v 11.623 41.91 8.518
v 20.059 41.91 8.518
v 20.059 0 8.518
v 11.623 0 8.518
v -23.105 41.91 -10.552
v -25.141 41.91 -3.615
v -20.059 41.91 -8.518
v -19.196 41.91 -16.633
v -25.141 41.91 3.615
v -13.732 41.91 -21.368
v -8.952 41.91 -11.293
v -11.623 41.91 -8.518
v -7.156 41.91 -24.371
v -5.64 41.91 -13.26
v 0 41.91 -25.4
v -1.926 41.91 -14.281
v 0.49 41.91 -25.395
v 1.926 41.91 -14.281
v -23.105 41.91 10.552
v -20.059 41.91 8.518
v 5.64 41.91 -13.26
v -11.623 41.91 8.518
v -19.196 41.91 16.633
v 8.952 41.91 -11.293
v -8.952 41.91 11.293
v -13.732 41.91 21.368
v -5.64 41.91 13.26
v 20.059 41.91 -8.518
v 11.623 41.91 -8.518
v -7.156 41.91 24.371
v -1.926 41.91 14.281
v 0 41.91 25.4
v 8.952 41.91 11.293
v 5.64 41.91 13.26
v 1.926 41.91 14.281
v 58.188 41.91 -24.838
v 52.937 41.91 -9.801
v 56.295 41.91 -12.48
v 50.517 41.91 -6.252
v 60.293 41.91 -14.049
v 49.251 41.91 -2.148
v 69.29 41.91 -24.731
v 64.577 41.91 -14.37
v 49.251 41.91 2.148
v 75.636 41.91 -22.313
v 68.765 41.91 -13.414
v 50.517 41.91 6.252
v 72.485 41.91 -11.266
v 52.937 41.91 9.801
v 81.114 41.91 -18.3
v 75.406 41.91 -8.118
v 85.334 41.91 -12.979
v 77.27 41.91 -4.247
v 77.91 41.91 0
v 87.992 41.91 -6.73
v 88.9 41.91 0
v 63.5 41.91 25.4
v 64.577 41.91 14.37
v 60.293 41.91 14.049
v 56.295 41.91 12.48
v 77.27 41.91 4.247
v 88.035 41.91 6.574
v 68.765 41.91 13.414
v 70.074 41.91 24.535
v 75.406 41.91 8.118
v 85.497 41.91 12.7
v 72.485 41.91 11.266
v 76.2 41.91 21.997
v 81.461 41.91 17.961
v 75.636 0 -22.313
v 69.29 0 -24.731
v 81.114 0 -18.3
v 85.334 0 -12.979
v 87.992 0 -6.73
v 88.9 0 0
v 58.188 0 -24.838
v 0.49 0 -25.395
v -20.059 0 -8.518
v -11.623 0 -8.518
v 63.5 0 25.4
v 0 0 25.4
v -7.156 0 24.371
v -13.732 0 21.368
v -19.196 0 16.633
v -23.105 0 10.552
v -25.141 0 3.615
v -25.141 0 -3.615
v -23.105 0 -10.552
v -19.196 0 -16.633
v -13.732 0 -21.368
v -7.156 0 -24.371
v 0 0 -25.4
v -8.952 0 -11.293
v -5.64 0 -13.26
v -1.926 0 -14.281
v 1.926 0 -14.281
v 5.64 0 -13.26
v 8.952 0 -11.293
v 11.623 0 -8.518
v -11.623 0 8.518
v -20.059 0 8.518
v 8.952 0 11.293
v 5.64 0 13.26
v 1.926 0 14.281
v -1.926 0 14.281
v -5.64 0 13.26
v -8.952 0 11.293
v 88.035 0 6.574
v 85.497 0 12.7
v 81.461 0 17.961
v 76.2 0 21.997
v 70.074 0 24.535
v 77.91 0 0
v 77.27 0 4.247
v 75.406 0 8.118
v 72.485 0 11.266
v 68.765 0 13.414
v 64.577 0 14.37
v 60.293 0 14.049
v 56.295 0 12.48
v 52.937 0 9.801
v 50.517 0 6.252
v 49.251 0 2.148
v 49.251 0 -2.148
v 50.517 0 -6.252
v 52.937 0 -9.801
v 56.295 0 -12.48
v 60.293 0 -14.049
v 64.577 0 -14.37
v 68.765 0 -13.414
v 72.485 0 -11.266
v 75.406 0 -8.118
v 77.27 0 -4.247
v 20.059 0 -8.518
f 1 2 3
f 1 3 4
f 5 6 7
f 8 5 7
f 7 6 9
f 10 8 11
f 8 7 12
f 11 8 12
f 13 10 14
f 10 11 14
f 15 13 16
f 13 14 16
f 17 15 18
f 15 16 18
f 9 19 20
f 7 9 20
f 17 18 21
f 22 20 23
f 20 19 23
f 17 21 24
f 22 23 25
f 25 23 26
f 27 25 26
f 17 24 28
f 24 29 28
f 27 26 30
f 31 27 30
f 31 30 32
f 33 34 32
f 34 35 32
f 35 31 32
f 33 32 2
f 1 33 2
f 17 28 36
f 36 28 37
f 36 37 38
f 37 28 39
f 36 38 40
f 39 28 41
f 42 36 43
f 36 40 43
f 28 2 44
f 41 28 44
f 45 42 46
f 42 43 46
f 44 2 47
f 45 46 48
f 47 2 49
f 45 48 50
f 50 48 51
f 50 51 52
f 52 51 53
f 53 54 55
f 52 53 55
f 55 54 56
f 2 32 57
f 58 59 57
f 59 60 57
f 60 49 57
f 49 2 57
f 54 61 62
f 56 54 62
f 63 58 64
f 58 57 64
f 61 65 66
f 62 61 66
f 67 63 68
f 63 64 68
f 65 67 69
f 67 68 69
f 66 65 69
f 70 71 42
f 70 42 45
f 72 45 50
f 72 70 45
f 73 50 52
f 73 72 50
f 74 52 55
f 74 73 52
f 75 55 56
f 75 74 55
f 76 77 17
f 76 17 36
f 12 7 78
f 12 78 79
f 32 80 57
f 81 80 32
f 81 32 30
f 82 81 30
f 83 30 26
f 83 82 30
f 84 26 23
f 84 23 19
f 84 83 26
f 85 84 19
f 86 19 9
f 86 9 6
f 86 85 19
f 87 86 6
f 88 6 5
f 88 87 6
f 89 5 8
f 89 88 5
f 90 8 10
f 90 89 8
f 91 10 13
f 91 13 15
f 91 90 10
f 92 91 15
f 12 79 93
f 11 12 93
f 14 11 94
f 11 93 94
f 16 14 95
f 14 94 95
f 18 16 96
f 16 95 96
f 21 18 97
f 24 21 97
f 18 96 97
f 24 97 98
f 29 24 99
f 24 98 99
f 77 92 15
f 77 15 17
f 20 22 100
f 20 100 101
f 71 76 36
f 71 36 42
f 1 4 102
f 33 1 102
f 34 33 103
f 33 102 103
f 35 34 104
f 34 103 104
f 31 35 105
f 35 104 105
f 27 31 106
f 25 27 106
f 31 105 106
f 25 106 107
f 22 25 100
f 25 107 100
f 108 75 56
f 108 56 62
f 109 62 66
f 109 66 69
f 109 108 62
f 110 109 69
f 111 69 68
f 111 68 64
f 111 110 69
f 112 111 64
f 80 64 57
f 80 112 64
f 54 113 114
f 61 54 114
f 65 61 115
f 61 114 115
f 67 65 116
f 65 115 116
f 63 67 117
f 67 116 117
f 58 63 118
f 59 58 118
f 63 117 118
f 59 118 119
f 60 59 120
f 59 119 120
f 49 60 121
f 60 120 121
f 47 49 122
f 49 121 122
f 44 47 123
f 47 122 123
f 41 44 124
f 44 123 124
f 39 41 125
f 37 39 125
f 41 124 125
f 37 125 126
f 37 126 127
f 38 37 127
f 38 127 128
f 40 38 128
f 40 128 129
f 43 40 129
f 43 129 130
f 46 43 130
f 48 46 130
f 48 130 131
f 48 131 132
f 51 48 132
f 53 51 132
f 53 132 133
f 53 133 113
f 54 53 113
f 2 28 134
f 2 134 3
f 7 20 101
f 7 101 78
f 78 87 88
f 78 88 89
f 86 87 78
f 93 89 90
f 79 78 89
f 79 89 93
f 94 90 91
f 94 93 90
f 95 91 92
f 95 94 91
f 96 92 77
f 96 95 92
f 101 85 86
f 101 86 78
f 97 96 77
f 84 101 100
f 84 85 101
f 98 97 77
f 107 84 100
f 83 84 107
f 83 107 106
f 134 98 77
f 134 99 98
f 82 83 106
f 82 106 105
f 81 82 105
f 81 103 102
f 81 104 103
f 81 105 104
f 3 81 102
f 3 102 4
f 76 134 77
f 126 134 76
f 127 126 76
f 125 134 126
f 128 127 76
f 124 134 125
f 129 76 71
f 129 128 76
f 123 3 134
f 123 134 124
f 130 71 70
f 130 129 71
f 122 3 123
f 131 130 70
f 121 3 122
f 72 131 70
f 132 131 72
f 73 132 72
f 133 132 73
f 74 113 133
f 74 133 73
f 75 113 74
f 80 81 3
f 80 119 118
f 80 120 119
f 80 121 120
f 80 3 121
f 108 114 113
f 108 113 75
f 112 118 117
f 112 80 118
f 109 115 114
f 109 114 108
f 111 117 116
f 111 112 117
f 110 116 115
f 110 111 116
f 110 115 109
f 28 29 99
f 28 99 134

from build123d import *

# Parameters (mm, degrees)
F0_R     = 14.4101824993
F1_DEPTH = 41.91
F4_DEPTH = 119.38


# Not quite as in the source:
# - a feature of the source that left no trace in its solid (it failed there, or was rolled back) is left out


with BuildPart() as f1:
    # F0 (on Front) → F1 (new body)
    with BuildSketch(Plane.XZ):
        with BuildLine():
            ThreePointArc((0.4902951327, -25.3952674859), (18.133029206, -17.7863220429), (25.4, 0))
            ThreePointArc((25.4, 0), (17.9605122421, 17.9605122421), (0, 25.4))
            ThreePointArc((0, 25.4), (-25.4, 0), (0, -25.4))
            Line((0, -25.4), (0.4902951327, -25.3952674859))
        make_face()
        with BuildLine():
            ThreePointArc((-11.6233856549, 8.5176443681), (0, 14.4101824993), (11.6233856549, 8.5176443681))
            Line((11.6233856549, 8.5176443681), (20.0593080372, 8.5176443681))
            Line((20.0593080372, 8.5176443681), (20.0593080372, -8.5176443681))
            Line((20.0593080372, -8.5176443681), (11.6233856549, -8.5176443681))
            ThreePointArc((11.6233856549, -8.5176443681), (0, -14.4101824993), (-11.6233856549, -8.5176443681))
            Line((-11.6233856549, -8.5176443681), (-20.0593080372, -8.5176443681))
            Line((-20.0593080372, -8.5176443681), (-20.0593080372, 8.5176443681))
            Line((-20.0593080372, 8.5176443681), (-11.6233856549, 8.5176443681))
        make_face(mode=Mode.SUBTRACT)
        with BuildLine():
            ThreePointArc((0, 25.4), (17.9605122421, 17.9605122421), (25.4, 0))
            ThreePointArc((25.4, 0), (18.133029206, -17.7863220429), (0.4902951327, -25.3952674859))
            Line((0.4902951327, -25.3952674859), (58.1880762297, -24.8383466813))
            ThreePointArc((58.1880762297, -24.8383466813), (38.2408035984, 2.670767146), (63.5, 25.4))
            Line((63.5, 25.4), (0, 25.4))
        make_face()
        with BuildLine():
            ThreePointArc((88.9, 0), (81.4605122421, 17.9605122421), (63.5, 25.4))
            ThreePointArc((63.5, 25.4), (38.2408035984, 2.670767146), (58.1880762297, -24.8383466813))
            Line((58.1880762297, -24.8383466813), (69.2903876179, -24.7311829728))
            ThreePointArc((69.2903876179, -24.7311829728), (83.4027114421, -15.7810670505), (88.9, 0))
        make_face()
        with Locations((63.5, 0)):
            Circle(F0_R, mode=Mode.SUBTRACT)
        with Locations((63.5, 0)):
            Circle(F0_R)
        with BuildLine():
            ThreePointArc((-11.6233856549, -8.5176443681), (-14.4101824993, 0), (-11.6233856549, 8.5176443681))
            Line((-11.6233856549, 8.5176443681), (-20.0593080372, 8.5176443681))
            Line((-20.0593080372, 8.5176443681), (-20.0593080372, -8.5176443681))
            Line((-20.0593080372, -8.5176443681), (-11.6233856549, -8.5176443681))
        make_face()
        with BuildLine():
            ThreePointArc((11.6233856549, -8.5176443681), (13.6957743156, -4.4809737288), (14.4101824993, 0))
            ThreePointArc((14.4101824993, 0), (13.6957743156, 4.4809737288), (11.6233856549, 8.5176443681))
            Line((11.6233856549, 8.5176443681), (-11.6233856549, 8.5176443681))
            ThreePointArc((-11.6233856549, 8.5176443681), (-14.4101824993, 0), (-11.6233856549, -8.5176443681))
            Line((-11.6233856549, -8.5176443681), (11.6233856549, -8.5176443681))
        make_face()
        with BuildLine():
            Line((-11.6233856549, 8.5176443681), (11.6233856549, 8.5176443681))
            ThreePointArc((11.6233856549, 8.5176443681), (0, 14.4101824993), (-11.6233856549, 8.5176443681))
        make_face()
        with BuildLine():
            ThreePointArc((-11.6233856549, -8.5176443681), (0, -14.4101824993), (11.6233856549, -8.5176443681))
            Line((11.6233856549, -8.5176443681), (-11.6233856549, -8.5176443681))
        make_face()
        with BuildLine():
            ThreePointArc((11.6233856549, 8.5176443681), (13.6957743156, 4.4809737288), (14.4101824993, 0))
            ThreePointArc((14.4101824993, 0), (13.6957743156, -4.4809737288), (11.6233856549, -8.5176443681))
            Line((11.6233856549, -8.5176443681), (20.0593080372, -8.5176443681))
            Line((20.0593080372, -8.5176443681), (20.0593080372, 8.5176443681))
            Line((20.0593080372, 8.5176443681), (11.6233856549, 8.5176443681))
        make_face()
    extrude(amount=-F1_DEPTH)

    # F0 (on Front) → F4 (cut)
    with BuildSketch(Plane.XZ):
        with BuildLine():
            ThreePointArc((-11.6233856549, -8.5176443681), (-14.4101824993, 0), (-11.6233856549, 8.5176443681))
            Line((-11.6233856549, 8.5176443681), (-20.0593080372, 8.5176443681))
            Line((-20.0593080372, 8.5176443681), (-20.0593080372, -8.5176443681))
            Line((-20.0593080372, -8.5176443681), (-11.6233856549, -8.5176443681))
        make_face()
        with BuildLine():
            Line((-11.6233856549, 8.5176443681), (11.6233856549, 8.5176443681))
            ThreePointArc((11.6233856549, 8.5176443681), (0, 14.4101824993), (-11.6233856549, 8.5176443681))
        make_face()
        with BuildLine():
            ThreePointArc((11.6233856549, 8.5176443681), (13.6957743156, 4.4809737288), (14.4101824993, 0))
            ThreePointArc((14.4101824993, 0), (13.6957743156, -4.4809737288), (11.6233856549, -8.5176443681))
            Line((11.6233856549, -8.5176443681), (20.0593080372, -8.5176443681))
            Line((20.0593080372, -8.5176443681), (20.0593080372, 8.5176443681))
            Line((20.0593080372, 8.5176443681), (11.6233856549, 8.5176443681))
        make_face()
        with BuildLine():
            ThreePointArc((11.6233856549, -8.5176443681), (13.6957743156, -4.4809737288), (14.4101824993, 0))
            ThreePointArc((14.4101824993, 0), (13.6957743156, 4.4809737288), (11.6233856549, 8.5176443681))
            Line((11.6233856549, 8.5176443681), (-11.6233856549, 8.5176443681))
            ThreePointArc((-11.6233856549, 8.5176443681), (-14.4101824993, 0), (-11.6233856549, -8.5176443681))
            Line((-11.6233856549, -8.5176443681), (11.6233856549, -8.5176443681))
        make_face()
        with BuildLine():
            ThreePointArc((-11.6233856549, -8.5176443681), (0, -14.4101824993), (11.6233856549, -8.5176443681))
            Line((11.6233856549, -8.5176443681), (-11.6233856549, -8.5176443681))
        make_face()
        with Locations((63.5, 0)):
            Circle(F0_R)
    extrude(amount=-F4_DEPTH, mode=Mode.SUBTRACT)


solid = f1.part
